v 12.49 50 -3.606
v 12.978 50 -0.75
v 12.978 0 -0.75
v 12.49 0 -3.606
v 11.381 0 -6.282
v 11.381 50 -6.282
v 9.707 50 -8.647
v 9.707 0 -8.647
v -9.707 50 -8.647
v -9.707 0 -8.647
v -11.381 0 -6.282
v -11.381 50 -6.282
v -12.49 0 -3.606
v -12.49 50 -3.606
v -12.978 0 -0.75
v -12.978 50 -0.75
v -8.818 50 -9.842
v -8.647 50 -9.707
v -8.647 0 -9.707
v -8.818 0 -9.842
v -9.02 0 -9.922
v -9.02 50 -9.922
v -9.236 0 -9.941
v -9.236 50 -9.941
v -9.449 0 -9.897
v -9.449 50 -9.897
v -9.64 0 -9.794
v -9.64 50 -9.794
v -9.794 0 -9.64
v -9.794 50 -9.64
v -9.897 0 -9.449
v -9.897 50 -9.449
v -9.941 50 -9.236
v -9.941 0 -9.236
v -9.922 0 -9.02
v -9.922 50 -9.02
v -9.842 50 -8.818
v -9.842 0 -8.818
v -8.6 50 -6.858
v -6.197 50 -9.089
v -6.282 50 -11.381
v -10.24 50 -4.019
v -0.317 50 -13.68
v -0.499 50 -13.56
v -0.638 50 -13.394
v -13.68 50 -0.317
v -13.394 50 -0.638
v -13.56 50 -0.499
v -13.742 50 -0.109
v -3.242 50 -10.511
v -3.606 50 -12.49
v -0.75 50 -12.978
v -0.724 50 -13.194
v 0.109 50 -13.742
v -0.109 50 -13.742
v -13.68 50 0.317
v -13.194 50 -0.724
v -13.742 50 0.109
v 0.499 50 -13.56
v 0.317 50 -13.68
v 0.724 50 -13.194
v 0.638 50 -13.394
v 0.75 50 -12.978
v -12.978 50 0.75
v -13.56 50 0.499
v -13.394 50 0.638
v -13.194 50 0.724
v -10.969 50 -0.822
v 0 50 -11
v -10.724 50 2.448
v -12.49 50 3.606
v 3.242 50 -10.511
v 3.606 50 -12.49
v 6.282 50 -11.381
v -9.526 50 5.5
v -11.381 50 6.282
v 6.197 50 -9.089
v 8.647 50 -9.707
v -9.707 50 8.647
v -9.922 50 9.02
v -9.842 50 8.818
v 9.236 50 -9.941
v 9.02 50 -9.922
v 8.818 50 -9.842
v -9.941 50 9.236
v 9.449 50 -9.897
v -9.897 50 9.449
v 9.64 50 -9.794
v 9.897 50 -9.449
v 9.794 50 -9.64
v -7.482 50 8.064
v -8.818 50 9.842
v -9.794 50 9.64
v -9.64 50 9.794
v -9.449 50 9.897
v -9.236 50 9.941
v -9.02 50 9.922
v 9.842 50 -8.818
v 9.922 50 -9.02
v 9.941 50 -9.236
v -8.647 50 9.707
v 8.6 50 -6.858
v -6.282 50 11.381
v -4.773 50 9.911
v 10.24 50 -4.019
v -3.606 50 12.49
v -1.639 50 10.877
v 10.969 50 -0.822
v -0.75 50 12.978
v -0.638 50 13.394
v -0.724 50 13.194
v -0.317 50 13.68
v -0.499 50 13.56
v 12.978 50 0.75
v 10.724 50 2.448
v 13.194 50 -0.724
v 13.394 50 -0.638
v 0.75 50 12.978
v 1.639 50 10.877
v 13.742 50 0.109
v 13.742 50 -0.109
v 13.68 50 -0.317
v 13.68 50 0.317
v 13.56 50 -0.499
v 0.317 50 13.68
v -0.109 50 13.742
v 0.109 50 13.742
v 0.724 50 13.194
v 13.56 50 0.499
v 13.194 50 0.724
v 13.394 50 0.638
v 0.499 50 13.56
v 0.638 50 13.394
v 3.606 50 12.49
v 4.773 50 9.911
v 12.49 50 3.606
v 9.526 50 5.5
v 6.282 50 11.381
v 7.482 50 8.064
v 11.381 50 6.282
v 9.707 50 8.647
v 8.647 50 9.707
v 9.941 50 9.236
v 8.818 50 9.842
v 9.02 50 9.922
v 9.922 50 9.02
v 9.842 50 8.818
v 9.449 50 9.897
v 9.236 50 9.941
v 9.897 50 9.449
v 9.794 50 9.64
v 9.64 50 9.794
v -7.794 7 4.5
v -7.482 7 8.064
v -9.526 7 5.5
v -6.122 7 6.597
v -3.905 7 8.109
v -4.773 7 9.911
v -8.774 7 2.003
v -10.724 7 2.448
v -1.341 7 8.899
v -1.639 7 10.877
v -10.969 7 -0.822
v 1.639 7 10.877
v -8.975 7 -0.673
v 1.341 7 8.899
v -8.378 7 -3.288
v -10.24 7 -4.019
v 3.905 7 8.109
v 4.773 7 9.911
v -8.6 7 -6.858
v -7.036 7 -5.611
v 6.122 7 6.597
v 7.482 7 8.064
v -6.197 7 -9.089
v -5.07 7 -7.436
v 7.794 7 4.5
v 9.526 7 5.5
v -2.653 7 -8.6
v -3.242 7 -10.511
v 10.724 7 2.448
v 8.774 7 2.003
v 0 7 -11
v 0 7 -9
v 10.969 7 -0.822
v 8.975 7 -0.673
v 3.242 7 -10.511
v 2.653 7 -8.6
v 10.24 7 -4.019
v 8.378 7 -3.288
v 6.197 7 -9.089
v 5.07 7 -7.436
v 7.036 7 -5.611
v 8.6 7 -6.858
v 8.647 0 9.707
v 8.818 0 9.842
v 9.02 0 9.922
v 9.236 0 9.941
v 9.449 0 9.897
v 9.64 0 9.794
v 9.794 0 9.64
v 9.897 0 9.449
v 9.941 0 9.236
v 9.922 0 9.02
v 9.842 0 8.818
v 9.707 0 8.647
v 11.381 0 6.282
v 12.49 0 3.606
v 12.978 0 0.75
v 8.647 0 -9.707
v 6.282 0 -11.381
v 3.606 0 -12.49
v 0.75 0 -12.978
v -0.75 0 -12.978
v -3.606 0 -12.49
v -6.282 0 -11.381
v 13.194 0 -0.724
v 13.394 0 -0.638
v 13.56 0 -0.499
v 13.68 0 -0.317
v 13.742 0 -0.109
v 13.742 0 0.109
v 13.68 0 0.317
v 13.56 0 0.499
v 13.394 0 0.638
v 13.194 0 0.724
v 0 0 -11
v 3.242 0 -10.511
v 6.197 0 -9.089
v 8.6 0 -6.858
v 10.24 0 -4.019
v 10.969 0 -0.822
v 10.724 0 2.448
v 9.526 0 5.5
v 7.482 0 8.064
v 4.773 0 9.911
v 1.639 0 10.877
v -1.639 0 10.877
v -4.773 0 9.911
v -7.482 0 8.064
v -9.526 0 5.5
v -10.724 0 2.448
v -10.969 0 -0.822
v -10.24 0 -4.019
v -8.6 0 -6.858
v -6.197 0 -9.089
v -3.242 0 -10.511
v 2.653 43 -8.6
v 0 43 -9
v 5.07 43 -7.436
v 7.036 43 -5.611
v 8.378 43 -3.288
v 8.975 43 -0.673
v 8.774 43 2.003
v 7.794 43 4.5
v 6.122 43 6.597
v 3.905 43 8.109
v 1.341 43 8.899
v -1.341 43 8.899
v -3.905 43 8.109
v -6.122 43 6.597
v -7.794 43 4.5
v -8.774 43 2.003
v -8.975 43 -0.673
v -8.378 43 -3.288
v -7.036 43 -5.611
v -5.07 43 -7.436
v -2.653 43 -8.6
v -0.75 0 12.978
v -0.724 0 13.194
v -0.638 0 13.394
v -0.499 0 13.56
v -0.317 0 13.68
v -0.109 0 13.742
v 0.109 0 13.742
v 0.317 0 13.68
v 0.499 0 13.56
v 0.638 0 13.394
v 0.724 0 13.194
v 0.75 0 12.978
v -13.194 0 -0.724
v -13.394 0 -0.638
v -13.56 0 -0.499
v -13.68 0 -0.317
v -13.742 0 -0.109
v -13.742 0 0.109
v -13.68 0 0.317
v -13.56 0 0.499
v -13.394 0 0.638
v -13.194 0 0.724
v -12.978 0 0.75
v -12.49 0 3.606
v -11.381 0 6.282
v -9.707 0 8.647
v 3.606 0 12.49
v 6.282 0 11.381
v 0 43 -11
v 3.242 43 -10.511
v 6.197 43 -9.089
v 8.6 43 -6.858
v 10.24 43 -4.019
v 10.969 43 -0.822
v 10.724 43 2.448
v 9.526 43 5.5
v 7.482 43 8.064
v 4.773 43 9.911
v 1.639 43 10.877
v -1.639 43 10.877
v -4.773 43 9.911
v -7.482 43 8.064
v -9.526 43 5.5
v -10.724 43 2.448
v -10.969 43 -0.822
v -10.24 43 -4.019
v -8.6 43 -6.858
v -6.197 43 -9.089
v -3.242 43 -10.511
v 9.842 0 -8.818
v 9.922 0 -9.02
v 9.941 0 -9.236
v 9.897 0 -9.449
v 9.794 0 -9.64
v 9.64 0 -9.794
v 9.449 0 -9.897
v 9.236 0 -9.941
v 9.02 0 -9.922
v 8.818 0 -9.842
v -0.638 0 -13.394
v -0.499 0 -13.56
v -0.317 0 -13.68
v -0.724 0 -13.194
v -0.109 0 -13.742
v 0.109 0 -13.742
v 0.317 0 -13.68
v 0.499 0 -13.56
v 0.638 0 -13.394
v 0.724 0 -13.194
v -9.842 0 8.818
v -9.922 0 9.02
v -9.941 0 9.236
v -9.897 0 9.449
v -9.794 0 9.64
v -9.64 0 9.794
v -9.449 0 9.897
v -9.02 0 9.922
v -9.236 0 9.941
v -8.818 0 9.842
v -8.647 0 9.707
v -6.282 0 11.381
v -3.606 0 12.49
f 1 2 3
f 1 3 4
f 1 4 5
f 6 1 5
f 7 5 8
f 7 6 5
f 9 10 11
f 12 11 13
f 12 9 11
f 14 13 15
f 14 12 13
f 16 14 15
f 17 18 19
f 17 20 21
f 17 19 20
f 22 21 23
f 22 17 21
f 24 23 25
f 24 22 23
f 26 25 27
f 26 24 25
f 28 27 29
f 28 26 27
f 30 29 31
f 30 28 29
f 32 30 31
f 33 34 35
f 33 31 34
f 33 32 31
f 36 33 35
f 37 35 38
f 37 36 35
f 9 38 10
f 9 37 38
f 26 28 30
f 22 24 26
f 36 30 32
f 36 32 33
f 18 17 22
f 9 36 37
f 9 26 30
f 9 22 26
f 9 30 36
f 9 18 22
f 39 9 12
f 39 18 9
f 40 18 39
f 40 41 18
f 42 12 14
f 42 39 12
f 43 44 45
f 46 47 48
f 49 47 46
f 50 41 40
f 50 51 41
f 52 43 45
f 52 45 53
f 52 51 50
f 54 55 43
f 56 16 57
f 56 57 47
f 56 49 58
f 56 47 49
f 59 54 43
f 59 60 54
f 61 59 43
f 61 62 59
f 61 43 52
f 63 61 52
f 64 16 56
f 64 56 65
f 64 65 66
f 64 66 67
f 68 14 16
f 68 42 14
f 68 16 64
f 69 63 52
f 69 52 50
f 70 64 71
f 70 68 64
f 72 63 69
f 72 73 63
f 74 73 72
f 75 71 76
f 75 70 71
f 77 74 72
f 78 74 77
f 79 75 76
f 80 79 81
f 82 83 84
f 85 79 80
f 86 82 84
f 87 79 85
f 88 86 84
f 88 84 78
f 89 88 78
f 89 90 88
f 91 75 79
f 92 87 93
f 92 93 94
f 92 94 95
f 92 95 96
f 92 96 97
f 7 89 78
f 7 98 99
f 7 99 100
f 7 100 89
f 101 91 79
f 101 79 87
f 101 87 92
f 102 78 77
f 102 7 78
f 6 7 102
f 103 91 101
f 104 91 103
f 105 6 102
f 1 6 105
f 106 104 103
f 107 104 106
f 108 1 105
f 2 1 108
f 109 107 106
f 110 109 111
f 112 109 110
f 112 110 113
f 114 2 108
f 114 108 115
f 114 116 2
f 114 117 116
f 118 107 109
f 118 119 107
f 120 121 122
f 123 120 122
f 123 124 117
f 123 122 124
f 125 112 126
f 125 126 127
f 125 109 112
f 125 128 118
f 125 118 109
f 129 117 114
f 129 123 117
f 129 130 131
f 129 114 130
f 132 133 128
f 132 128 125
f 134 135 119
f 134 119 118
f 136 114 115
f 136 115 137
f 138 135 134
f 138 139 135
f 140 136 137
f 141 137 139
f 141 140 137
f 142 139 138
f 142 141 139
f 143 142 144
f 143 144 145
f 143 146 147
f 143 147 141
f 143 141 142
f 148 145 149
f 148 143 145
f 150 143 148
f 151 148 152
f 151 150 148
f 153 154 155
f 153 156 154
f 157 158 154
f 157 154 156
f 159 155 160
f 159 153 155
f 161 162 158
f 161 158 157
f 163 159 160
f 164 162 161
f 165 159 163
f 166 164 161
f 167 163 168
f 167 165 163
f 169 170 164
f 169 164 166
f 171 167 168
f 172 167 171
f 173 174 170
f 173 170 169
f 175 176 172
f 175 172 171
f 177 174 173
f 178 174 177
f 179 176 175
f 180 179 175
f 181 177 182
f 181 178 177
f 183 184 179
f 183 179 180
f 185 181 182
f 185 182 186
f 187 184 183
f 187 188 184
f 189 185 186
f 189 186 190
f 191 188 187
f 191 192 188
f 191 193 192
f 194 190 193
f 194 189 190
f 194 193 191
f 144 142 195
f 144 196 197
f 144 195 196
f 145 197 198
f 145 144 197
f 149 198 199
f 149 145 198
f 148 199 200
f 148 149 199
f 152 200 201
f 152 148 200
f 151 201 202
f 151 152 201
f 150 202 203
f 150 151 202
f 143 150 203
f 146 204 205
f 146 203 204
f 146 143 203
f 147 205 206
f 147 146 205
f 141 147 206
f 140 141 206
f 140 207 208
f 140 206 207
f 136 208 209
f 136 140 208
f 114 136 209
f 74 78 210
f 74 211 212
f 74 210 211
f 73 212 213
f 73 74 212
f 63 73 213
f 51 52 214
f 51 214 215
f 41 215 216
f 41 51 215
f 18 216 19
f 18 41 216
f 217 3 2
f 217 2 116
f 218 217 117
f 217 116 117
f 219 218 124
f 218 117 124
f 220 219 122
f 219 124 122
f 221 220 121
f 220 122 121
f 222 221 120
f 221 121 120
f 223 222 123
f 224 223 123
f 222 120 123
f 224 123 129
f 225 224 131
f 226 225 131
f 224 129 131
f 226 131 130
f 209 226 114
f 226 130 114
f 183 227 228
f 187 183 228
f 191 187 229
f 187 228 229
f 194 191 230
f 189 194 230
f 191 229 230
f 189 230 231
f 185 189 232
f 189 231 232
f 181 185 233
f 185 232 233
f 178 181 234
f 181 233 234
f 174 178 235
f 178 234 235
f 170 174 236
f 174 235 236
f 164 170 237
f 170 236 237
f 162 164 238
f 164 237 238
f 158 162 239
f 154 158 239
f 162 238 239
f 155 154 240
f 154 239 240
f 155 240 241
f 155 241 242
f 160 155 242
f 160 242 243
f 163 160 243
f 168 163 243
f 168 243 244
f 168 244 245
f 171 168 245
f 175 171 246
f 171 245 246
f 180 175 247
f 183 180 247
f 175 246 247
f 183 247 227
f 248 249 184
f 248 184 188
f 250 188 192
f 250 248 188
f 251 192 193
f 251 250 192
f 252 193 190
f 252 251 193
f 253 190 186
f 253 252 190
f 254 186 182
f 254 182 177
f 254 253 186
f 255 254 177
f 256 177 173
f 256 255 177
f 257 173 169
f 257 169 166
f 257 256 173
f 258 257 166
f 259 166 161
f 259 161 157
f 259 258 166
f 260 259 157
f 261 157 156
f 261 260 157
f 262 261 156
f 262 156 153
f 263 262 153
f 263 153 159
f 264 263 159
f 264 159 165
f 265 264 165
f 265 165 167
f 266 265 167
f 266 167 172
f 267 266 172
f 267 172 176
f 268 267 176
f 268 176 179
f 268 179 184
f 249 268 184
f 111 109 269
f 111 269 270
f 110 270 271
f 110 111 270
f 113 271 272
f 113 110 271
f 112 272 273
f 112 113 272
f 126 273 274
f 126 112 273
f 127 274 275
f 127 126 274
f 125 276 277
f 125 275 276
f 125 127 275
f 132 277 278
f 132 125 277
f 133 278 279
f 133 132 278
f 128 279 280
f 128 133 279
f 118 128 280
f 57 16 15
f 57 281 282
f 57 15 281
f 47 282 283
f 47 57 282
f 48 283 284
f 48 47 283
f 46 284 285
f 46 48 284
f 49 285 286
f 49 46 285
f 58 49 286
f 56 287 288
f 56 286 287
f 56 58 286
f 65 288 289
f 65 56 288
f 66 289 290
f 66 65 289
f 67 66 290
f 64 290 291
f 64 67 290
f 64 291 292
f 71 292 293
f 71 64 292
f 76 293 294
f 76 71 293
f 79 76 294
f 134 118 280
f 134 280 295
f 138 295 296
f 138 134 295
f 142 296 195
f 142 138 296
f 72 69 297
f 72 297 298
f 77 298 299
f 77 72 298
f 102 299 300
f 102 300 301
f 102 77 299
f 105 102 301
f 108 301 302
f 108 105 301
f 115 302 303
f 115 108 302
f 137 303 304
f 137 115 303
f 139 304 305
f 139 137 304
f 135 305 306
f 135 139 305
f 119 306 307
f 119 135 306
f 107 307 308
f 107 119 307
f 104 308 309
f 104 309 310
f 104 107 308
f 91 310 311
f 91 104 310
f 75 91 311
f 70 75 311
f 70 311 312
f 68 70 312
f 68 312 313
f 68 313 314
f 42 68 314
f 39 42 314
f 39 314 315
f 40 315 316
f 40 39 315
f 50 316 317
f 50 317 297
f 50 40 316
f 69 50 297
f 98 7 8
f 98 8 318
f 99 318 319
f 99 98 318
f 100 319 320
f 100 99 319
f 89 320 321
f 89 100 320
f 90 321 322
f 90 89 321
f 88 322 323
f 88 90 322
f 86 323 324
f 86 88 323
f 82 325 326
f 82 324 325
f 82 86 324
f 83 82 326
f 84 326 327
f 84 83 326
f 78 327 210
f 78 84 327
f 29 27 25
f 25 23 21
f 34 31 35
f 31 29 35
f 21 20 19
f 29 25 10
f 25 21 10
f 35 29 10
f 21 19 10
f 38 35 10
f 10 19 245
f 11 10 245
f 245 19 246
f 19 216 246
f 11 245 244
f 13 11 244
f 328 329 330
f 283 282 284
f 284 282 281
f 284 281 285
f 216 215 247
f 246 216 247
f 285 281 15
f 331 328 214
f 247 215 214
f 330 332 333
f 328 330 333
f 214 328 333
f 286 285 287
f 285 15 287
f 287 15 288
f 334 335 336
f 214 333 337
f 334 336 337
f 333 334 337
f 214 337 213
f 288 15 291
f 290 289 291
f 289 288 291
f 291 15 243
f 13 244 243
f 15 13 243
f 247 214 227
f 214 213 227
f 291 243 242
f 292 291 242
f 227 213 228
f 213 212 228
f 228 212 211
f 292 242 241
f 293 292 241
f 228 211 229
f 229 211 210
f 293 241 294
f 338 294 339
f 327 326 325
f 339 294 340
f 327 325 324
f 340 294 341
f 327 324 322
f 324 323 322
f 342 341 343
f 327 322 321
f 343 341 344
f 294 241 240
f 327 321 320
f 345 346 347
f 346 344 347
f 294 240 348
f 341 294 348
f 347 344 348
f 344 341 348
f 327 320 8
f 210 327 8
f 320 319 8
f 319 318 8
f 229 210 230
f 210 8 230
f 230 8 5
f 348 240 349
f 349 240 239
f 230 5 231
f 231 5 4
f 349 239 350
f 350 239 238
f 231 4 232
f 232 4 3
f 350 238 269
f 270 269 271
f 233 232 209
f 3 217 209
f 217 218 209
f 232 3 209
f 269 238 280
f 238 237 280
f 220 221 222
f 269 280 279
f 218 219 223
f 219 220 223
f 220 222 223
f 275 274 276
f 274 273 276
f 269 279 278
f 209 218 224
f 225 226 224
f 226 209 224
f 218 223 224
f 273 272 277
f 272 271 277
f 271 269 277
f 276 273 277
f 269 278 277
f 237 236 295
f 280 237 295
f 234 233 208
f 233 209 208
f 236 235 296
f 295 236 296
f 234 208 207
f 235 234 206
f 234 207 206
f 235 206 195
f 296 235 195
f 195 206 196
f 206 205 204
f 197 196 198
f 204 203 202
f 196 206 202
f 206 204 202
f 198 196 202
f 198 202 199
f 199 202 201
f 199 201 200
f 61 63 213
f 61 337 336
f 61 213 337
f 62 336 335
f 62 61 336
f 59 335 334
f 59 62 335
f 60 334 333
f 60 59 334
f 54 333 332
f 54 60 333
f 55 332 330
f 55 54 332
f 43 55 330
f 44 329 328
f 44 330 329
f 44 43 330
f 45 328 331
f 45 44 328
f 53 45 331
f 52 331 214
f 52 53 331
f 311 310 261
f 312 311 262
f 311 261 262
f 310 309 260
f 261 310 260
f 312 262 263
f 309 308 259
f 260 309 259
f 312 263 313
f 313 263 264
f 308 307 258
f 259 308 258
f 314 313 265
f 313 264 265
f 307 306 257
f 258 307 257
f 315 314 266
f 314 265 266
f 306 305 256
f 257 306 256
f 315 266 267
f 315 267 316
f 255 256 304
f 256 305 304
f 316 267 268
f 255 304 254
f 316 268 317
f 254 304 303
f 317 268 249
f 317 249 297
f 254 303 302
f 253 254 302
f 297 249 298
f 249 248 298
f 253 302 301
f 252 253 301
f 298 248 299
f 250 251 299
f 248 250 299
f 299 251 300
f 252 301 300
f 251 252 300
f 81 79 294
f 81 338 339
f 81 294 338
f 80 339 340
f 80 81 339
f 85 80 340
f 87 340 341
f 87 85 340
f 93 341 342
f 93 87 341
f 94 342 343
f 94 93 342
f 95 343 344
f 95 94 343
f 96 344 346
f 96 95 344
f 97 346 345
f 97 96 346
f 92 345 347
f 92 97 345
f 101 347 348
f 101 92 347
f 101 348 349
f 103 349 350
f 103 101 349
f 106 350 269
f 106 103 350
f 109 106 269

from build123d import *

# Parameters (mm, degrees)
ESQUISSE2_R                  = 13
BOSS_EXTRU_1_DEPTH           = 25
ESQUISSE3_R                  = 9
ENL_V_MAT_EXTRU_1_DEPTH      = 32.032241298
ESQUISSE4_R                  = 11
ENL_V_MAT_EXTRU_2_DEPTH      = 7
ESQUISSE6_R                  = 0.75
BOSS_EXTRU_2_DEPTH           = 25
R_P_TITION_CIRCULAIRE1_COUNT = 8
SYM_TRIE2_COPY_1_SKETCH_R    = 0.75
SYM_TRIE2_COPY_1_DEPTH       = 25
SYM_TRIE2_COPY_2_SKETCH_R    = 0.75
SYM_TRIE2_COPY_2_DEPTH       = 25
SYM_TRIE2_COPY_3_SKETCH_R    = 0.75
SYM_TRIE2_COPY_3_DEPTH       = 25
SYM_TRIE2_COPY_4_SKETCH_R    = 0.75
SYM_TRIE2_COPY_4_DEPTH       = 25
SYM_TRIE2_COPY_5_SKETCH_R    = 0.75
SYM_TRIE2_COPY_5_DEPTH       = 25
SYM_TRIE2_COPY_6_SKETCH_R    = 0.75
SYM_TRIE2_COPY_6_DEPTH       = 25
SYM_TRIE2_COPY_7_SKETCH_R    = 0.75
SYM_TRIE2_COPY_7_DEPTH       = 25


with BuildPart() as part:
    # Esquisse2 → Boss.-Extru.1 (new body)
    with BuildSketch(Plane(origin=(0, 0, 0), x_dir=(1, 0, 0), z_dir=(0, 1, 0))):
        with Locations(Location((0, 0, 0), (0, 0, 270))):
            Circle(ESQUISSE2_R)
    boss_extru_1 = extrude(amount=BOSS_EXTRU_1_DEPTH)

    # Esquisse3 → Enlèv. mat.-Extru.1 (cut, through all)
    with BuildSketch(Plane.XZ):
        with Locations(Location((0, 0, 0), (0, 0, 270))):
            Circle(ESQUISSE3_R)
    enl_v_mat_extru_1 = extrude(amount=-ENL_V_MAT_EXTRU_1_DEPTH, mode=Mode.SUBTRACT)

    # Esquisse4 → Enlèv. mat.-Extru.2 (cut)
    with BuildSketch(Plane.XZ):
        with Locations(Location((0, 0, 0), (0, 0, 270))):
            Circle(ESQUISSE4_R)
    enl_v_mat_extru_2 = extrude(amount=-ENL_V_MAT_EXTRU_2_DEPTH, mode=Mode.SUBTRACT)

    # Esquisse6 → Boss.-Extru.2 (add)
    with BuildSketch(Plane(origin=(0, 0, 0), x_dir=(-1, 0, 0), z_dir=(0, -1, 0))):
        with Locations((-13, 0)):
            Circle(ESQUISSE6_R)
    boss_extru_2 = extrude(amount=-BOSS_EXTRU_2_DEPTH)

    # Répétition circulaire1: Boss.-Extru.2 ×8 about axis
    r_p_tition_circulaire1_axis = Axis((0, 0, 0), (0, 1, 0))
    for i in range(1, R_P_TITION_CIRCULAIRE1_COUNT):
        add(boss_extru_2.rotate(r_p_tition_circulaire1_axis, i * 360 / R_P_TITION_CIRCULAIRE1_COUNT))

    # Symétrie2: Boss.-Extru.1, Enlèv. mat.-Extru.1, Enlèv. mat.-Extru.2, Boss.-Extru.2 across plane
    add(boss_extru_1.mirror(Plane.ZX.offset(25)))
    add(enl_v_mat_extru_1.mirror(Plane.ZX.offset(25)), mode=Mode.SUBTRACT)
    add(enl_v_mat_extru_2.mirror(Plane.ZX.offset(25)), mode=Mode.SUBTRACT)
    add(boss_extru_2.mirror(Plane.ZX.offset(25)))

    # Symétrie2 copy 1 sketch → Symétrie2 copy 1 (add)
    with BuildSketch(Plane(origin=(0, 50, 0), x_dir=(-0.7071067811865476, 0, 0.7071067811865475), z_dir=(0, 1, 0))):
        with Locations((-13, 0)):
            Circle(SYM_TRIE2_COPY_1_SKETCH_R)
    extrude(amount=-SYM_TRIE2_COPY_1_DEPTH)

    # Symétrie2 copy 2 sketch → Symétrie2 copy 2 (add)
    with BuildSketch(Plane.ZX.offset(50)):
        with Locations((-13, 0)):
            Circle(SYM_TRIE2_COPY_2_SKETCH_R)
    extrude(amount=-SYM_TRIE2_COPY_2_DEPTH)

    # Symétrie2 copy 3 sketch → Symétrie2 copy 3 (add)
    with BuildSketch(Plane(origin=(0, 50, 0), x_dir=(0.7071067811865475, 0, 0.7071067811865476), z_dir=(0, 1, 0))):
        with Locations((-13, 0)):
            Circle(SYM_TRIE2_COPY_3_SKETCH_R)
    extrude(amount=-SYM_TRIE2_COPY_3_DEPTH)

    # Symétrie2 copy 4 sketch → Symétrie2 copy 4 (add)
    with BuildSketch(Plane(origin=(0, 50, 0), x_dir=(1, 0, 0), z_dir=(0, 1, 0))):
        with Locations((-13, 0)):
            Circle(SYM_TRIE2_COPY_4_SKETCH_R)
    extrude(amount=-SYM_TRIE2_COPY_4_DEPTH)

    # Symétrie2 copy 5 sketch → Symétrie2 copy 5 (add)
    with BuildSketch(Plane(origin=(0, 50, 0), x_dir=(0.7071067811865477, 0, -0.7071067811865475), z_dir=(0, 1, 0))):
        with Locations((-13, 0)):
            Circle(SYM_TRIE2_COPY_5_SKETCH_R)
    extrude(amount=-SYM_TRIE2_COPY_5_DEPTH)

    # Symétrie2 copy 6 sketch → Symétrie2 copy 6 (add)
    with BuildSketch(Plane(origin=(0, 50, 0), x_dir=(0, 0, -1), z_dir=(0, 1, 0))):
        with Locations((-13, 0)):
            Circle(SYM_TRIE2_COPY_6_SKETCH_R)
    extrude(amount=-SYM_TRIE2_COPY_6_DEPTH)

    # Symétrie2 copy 7 sketch → Symétrie2 copy 7 (add)
    with BuildSketch(Plane(origin=(0, 50, 0), x_dir=(-0.7071067811865474, 0, -0.7071067811865477), z_dir=(0, 1, 0))):
        with Locations((-13, 0)):
            Circle(SYM_TRIE2_COPY_7_SKETCH_R)
    extrude(amount=-SYM_TRIE2_COPY_7_DEPTH)


solid = part.part
